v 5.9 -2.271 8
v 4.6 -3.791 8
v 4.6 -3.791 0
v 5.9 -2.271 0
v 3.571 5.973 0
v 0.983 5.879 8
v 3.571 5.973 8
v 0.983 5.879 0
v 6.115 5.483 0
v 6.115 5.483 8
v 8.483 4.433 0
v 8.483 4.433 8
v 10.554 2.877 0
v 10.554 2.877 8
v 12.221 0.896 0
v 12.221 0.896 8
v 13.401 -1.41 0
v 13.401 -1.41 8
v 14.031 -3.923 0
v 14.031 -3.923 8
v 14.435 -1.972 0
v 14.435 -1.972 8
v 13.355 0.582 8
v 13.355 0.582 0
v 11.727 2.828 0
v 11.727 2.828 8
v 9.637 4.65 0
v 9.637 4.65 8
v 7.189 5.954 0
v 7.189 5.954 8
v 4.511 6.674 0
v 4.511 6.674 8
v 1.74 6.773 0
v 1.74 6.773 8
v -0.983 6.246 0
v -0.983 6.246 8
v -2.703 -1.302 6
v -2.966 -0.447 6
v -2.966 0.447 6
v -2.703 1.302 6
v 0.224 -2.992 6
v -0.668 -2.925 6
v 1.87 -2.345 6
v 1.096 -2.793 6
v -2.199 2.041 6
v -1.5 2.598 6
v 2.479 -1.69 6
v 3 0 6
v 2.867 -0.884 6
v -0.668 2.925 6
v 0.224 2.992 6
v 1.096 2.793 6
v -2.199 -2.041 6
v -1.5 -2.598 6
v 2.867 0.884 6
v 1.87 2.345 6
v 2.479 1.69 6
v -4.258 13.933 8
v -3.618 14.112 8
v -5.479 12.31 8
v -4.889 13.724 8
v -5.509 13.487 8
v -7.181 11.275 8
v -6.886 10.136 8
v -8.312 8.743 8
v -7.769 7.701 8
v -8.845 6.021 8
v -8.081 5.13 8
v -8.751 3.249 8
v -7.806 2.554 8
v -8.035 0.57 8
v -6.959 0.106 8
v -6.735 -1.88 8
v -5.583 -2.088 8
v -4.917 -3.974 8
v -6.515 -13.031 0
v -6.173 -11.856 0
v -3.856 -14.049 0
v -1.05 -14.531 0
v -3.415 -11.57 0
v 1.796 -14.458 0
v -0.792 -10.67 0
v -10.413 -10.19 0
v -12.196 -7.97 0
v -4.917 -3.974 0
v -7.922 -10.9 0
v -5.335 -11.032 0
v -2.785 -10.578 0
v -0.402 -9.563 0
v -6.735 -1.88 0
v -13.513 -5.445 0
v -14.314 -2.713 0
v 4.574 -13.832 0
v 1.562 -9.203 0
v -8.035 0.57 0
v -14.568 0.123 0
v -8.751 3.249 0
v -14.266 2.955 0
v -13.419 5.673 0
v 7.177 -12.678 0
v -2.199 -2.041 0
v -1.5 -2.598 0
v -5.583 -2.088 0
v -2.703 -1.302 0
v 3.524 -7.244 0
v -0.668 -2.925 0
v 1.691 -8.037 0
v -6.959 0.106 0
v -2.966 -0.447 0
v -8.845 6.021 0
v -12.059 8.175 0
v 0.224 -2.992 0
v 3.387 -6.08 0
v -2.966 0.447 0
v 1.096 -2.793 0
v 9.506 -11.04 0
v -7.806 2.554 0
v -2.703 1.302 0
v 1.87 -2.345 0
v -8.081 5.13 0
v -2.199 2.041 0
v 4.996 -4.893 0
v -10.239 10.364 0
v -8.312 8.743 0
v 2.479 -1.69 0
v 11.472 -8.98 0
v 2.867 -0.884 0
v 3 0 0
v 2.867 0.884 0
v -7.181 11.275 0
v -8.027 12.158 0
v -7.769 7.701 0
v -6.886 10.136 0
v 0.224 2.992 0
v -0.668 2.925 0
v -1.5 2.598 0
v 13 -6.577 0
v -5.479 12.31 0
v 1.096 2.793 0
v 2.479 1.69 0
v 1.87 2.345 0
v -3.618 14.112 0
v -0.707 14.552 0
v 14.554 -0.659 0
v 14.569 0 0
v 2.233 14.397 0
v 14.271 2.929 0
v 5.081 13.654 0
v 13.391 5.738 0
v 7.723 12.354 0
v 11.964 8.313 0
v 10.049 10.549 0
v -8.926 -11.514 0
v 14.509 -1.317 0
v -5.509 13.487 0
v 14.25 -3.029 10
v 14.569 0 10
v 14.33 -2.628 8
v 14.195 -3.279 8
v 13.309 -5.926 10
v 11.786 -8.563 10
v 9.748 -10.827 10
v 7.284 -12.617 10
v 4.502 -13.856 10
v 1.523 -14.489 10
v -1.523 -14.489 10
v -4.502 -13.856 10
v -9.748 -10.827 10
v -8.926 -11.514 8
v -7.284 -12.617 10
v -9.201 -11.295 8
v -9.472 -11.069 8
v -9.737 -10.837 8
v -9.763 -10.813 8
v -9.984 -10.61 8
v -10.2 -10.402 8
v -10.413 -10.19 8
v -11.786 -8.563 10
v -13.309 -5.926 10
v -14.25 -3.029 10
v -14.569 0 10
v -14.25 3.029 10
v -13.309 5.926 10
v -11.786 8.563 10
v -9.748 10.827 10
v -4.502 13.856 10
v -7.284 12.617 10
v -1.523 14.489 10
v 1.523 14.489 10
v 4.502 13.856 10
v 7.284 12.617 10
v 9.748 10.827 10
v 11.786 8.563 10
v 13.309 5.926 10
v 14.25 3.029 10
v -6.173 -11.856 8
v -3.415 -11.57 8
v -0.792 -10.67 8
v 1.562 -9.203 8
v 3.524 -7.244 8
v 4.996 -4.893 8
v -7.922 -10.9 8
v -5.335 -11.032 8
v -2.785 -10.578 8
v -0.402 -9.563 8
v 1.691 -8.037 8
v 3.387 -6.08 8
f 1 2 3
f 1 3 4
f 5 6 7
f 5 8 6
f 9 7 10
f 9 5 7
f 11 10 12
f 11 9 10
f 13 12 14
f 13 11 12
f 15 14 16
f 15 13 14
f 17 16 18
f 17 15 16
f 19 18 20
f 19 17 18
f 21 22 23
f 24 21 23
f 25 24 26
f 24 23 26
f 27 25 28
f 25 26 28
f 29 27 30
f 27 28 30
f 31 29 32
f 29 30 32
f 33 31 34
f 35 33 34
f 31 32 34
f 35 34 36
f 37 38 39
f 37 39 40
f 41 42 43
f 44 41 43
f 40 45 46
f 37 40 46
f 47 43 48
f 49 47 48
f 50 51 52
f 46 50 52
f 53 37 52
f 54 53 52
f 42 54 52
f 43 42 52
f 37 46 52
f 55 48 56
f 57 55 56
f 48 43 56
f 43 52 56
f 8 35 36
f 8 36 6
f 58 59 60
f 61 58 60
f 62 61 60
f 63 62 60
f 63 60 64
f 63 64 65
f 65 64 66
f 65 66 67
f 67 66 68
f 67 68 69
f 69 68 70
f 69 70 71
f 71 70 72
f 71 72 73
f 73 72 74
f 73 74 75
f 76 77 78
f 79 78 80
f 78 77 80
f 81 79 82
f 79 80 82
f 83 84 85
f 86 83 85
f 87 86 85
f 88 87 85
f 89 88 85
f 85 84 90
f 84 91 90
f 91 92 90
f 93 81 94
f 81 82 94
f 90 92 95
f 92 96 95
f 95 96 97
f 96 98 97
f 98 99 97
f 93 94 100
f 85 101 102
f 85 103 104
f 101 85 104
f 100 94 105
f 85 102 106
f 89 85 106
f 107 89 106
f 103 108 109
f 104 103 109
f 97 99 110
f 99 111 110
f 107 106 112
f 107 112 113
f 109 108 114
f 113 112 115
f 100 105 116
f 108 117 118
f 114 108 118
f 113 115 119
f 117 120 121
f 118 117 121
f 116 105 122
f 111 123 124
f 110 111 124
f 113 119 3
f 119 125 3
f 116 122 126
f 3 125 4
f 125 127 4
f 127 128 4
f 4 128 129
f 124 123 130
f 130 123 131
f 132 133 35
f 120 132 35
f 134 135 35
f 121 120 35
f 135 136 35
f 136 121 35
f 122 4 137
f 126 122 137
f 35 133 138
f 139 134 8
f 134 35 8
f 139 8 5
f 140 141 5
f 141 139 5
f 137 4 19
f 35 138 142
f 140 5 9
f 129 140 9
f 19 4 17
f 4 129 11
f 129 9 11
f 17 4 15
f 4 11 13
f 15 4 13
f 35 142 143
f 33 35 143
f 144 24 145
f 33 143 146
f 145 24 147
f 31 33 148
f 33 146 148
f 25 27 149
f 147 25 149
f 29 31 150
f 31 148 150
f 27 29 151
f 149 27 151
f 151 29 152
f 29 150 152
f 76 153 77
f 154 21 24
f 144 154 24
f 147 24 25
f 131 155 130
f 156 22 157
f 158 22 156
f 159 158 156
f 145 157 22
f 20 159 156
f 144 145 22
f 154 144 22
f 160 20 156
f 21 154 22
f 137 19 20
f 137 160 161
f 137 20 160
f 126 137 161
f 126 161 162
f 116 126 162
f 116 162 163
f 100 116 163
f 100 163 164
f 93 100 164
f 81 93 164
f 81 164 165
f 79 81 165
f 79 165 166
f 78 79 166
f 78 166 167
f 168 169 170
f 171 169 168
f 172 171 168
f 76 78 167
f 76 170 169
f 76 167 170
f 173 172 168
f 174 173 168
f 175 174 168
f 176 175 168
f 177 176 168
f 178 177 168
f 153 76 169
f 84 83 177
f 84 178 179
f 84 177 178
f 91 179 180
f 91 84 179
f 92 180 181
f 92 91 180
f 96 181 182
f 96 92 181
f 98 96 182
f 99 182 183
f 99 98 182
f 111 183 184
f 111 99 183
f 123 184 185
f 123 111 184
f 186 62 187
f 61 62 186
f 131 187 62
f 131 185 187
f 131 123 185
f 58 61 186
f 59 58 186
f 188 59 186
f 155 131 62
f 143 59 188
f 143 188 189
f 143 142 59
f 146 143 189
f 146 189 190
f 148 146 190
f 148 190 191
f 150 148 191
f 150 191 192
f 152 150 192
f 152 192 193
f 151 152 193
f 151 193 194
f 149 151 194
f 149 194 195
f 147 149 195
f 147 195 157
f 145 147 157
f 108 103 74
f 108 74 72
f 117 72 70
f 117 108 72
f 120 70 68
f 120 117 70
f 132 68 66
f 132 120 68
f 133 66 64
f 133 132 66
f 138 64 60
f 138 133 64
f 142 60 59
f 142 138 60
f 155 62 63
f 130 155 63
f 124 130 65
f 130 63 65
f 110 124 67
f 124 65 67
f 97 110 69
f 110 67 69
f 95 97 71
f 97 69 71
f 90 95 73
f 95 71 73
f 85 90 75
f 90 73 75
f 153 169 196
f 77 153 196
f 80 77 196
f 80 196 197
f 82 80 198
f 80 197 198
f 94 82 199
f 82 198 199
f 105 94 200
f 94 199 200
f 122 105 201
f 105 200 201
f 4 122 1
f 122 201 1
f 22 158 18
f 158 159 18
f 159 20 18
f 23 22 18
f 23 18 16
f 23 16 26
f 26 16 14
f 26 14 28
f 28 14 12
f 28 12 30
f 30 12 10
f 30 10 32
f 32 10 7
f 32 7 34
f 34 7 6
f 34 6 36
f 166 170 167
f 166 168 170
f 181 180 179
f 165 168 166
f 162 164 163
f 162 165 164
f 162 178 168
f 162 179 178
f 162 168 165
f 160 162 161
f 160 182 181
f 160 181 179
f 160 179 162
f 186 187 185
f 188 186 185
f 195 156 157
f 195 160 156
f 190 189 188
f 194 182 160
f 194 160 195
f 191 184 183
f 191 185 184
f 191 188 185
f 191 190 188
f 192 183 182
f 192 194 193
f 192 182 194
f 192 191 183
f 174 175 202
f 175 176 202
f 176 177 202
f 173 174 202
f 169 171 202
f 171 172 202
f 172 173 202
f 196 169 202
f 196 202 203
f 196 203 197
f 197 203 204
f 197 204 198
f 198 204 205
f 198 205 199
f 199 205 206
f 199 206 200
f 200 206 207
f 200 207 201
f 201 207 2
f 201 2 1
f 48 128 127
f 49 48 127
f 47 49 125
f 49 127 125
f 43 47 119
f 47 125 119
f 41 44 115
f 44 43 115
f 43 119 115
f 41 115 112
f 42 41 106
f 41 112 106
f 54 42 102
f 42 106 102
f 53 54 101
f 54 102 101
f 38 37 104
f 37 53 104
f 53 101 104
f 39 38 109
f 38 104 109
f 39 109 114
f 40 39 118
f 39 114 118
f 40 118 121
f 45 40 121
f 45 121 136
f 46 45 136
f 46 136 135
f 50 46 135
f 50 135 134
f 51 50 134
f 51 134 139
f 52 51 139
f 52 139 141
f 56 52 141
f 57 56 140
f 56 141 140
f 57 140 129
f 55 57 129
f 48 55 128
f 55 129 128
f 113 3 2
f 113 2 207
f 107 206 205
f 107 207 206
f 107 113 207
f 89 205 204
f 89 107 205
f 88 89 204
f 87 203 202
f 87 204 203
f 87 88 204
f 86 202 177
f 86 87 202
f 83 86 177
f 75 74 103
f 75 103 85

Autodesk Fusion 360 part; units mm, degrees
sketch "Sketch1" plane through (0, 0, 0) normal (0, 0, 1) x (1, 0, 0)
  circle A0 centre (0, 0) radius 3
  circle A1 centre (0, 0) radius 6.0622 construction
  line L0 (0, 6.0622) -> (-5.25, -3.0311) construction
  line L1 (5.25, -3.0311) -> (0, 6.0622) construction
  line L2 (-5.25, -3.0311) -> (5.25, -3.0311) construction
  circle A2 centre (0, 0) radius 14.5688
  arc A3 (14.25, -3.0311) -> (0, 6.0622) centre (2.6917, -5.4318) ccw
  arc A4 (-4.5, 13.8564) -> (-5.25, -3.0311) centre (3.3582, 5.047) ccw
  arc A5 (-9.75, -10.8253) -> (5.25, -3.0311) centre (-6.05, 0.3848) ccw
  point P0 (-4.5, 13.8564)
  point P1 (-9.75, -10.8253)
  point P2 (14.25, -3.0311)
  dimension "d1" = 6
  dimension "d2" = 10.5
  dimension "d3" = 9
extrude "Extrude1" add sketch "Sketch1" along normal blind 8 contours A0 | A2
extrude "Extrude2" cut sketch "Sketch1" along normal blind 5 contours A0
ref_plane "WorkPlane1" through (-9.75, -10.8253, 0) normal (-0.6692, -0.743, 0) x (0.743, -0.6692, 0)
sketch "Sketch2" plane through (-9.75, -10.8253, 0) normal (-0.6692, -0.743, 0) x (0.743, -0.6692, 0)
  line L0 (1, 0) -> (-1, 0)
  line L1 (-1, 0) -> (-1, 8)
  line L2 (-1, 8) -> (1, 8)
  line L3 (1, 8) -> (1, 0)
  dimension "d8" = 8
  dimension "d9" = 2
extrude "Extrude3" add 1 faces at (3.5599, 4.2905, 8) along direction (0, 0, 1) blind 2
ref_plane "WorkPlane2" through (-4.5, 13.8564, 0) normal (-0.3089, 0.9511, 0) x (-0.9511, -0.3089, 0)
sketch "Sketch3" plane through (-4.5, 13.8564, 0) normal (-0.3089, 0.9511, 0) x (-0.9511, -0.3089, 0)
  line L0 (1, 0) -> (-1, 0)
  line L1 (-1, 0) -> (-1, 8)
  line L2 (-1, 8) -> (1, 8)
  line L3 (1, 8) -> (1, 0)
  dimension "d12" = 8
  dimension "d13" = 2
sweep "Sweep1" cut profiles "Sketch3" path "Sketch1" along A4 section 1
sweep "Sweep2" cut profiles "Sketch2" path "Sketch1" along A5 section 1
ref_plane "WorkPlane3" through (14.25, -3.0311, 0) normal (0.9781, -0.2081, 0) x (0.2081, 0.9781, 0)
sketch "Sketch4" plane through (14.25, -3.0311, 0) normal (0.9781, -0.2081, 0) x (0.2081, 0.9781, 0)
  line L0 (-1, 8) -> (1, 8)
  line L1 (1, 8) -> (1, 0)
  line L2 (1, 0) -> (-1, 0)
  line L3 (-1, 0) -> (-1, 8)
  dimension "d26" = 8
  dimension "d27" = 2
sweep "Sweep3" cut profiles "Sketch4" path "Sketch1" along A3 section 1
extrude "Extrude4" cut sketch "Sketch1" along normal blind 6 contours A0
